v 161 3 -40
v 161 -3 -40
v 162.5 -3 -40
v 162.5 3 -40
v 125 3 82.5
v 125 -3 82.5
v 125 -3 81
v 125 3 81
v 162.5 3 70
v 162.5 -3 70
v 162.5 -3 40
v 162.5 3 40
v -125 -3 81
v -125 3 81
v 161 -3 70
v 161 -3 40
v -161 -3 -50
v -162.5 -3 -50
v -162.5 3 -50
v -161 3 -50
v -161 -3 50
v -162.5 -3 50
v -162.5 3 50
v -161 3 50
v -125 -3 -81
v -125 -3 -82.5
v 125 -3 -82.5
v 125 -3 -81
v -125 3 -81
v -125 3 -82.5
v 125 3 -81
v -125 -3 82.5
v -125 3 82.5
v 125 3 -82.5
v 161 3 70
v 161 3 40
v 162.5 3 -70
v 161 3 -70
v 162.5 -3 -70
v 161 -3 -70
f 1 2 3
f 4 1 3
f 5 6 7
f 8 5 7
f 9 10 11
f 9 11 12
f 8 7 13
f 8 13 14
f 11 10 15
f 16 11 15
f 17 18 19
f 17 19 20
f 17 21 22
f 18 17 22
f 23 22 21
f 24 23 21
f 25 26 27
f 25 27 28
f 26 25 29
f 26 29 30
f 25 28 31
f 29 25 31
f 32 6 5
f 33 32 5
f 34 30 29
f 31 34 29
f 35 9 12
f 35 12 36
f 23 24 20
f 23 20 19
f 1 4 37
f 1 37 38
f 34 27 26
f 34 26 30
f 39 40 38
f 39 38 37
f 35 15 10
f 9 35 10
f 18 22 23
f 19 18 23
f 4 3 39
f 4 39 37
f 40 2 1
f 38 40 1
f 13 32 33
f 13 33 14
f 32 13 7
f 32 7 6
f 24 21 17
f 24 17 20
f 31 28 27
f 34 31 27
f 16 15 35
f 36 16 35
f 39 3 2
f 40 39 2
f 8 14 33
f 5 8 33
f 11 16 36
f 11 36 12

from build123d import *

# Parameters (mm, degrees)
MEMBER_20_X_20_1_DEPTH      = 324.25
MEMBER_20_X_20_1_DEPTH_BACK = 0.75
SKETCH1_W                   = 1.5
SKETCH1_H                   = 6
SKETCH1_ON_SEGMENT_2_W      = 1.5
SKETCH1_ON_SEGMENT_2_H      = 6
MEMBER_20_X_20_1_2_DEPTH    = 325
SKETCH1_ON_SEGMENT_3_W      = 1.5
SKETCH1_ON_SEGMENT_3_H      = 6
MEMBER_20_X_20_1_3_DEPTH    = 165.5
SKETCH1_ON_SEGMENT_4_W      = 1.5
SKETCH1_ON_SEGMENT_4_H      = 6
MEMBER_20_X_20_1_4_DEPTH    = 165.5
CUT_EXTRUDE_1_DEPTH         = 183.267660324
CUT_EXTRUDE_1_DEPTH_BACK    = 183.267660324
SKETCH_3_W                  = 40
SKETCH_3_H                  = 40
SKETCH_3_W_2                = 92.543604288
SKETCH_3_H_2                = 30.493794054
SKETCH_3_W_3                = 46.059335171
SKETCH_3_H_3                = 80


with BuildPart() as part:
    # Sketch1 → Member 20 X 20_1 (new, two sides: drawn at the far end of the back side and taken through both)
    with BuildSketch(Plane(origin=(161.75, 0, -81.75), x_dir=(0, 0, 1), z_dir=(-1, 0, 0)).offset(-MEMBER_20_X_20_1_DEPTH_BACK)):
        Rectangle(SKETCH1_W, SKETCH1_H)
    extrude(amount=MEMBER_20_X_20_1_DEPTH + MEMBER_20_X_20_1_DEPTH_BACK)


with BuildPart() as body_2:
    # Sketch1 on segment 2 (carried to segment 2) → Member 20 X 20_1 2 (new body)
    with BuildSketch(Plane(origin=(162.5, 0, 81.75), x_dir=(0, 0, 1), z_dir=(-1, 0, 0))):
        Rectangle(SKETCH1_ON_SEGMENT_2_W, SKETCH1_ON_SEGMENT_2_H)
    extrude(amount=MEMBER_20_X_20_1_2_DEPTH)


with BuildPart() as body_3:
    # Sketch1 on segment 3 (carried to segment 3) → Member 20 X 20_1 3 (new body)
    with BuildSketch(Plane(origin=(-161.75, 0, 82.75), x_dir=(-1, 0, 0), z_dir=(0, 0, -1))):
        Rectangle(SKETCH1_ON_SEGMENT_3_W, SKETCH1_ON_SEGMENT_3_H)
    extrude(amount=MEMBER_20_X_20_1_3_DEPTH)

    # Member 20 X 20_1 3 end butt 1
    split(bisect_by=Plane(origin=(-161.75, 0, 81), x_dir=(0, 1, 0), z_dir=(0, 0, -1)), keep=Keep.TOP)

    # Member 20 X 20_1 3 end butt 2
    split(bisect_by=Plane(origin=(-161.75, 0, -81), x_dir=(0, -1, 0), z_dir=(0, 0, 1)), keep=Keep.TOP)


with BuildPart() as body_4:
    # Sketch1 on segment 4 (carried to segment 4) → Member 20 X 20_1 4 (new body)
    with BuildSketch(Plane(origin=(161.75, 0, 82.75), x_dir=(-1, 0, 0), z_dir=(0, 0, -1))):
        Rectangle(SKETCH1_ON_SEGMENT_4_W, SKETCH1_ON_SEGMENT_4_H)
    extrude(amount=MEMBER_20_X_20_1_4_DEPTH)

    # Member 20 X 20_1 4 end butt 1
    split(bisect_by=Plane(origin=(161.75, 0, 81), x_dir=(0, 1, 0), z_dir=(0, 0, -1)), keep=Keep.TOP)

    # Member 20 X 20_1 4 end butt 2
    split(bisect_by=Plane(origin=(161.75, 0, -81), x_dir=(0, -1, 0), z_dir=(0, 0, 1)), keep=Keep.TOP)


with BuildPart() as cut_extrude_1_tool:
    # Эскиз3 → Вырез-Вытянуть1 (new, two sides: drawn at the far end of the back side and taken through both)
    with BuildSketch(Plane(origin=(0, 0, 0), x_dir=(1, 0, 0), z_dir=(0, 1, 0)).offset(-CUT_EXTRUDE_1_DEPTH_BACK)):
        with Locations((-145, 70)):
            Rectangle(SKETCH_3_W, SKETCH_3_H)
        with Locations((-145, -70)):
            Rectangle(SKETCH_3_W, SKETCH_3_H)
        with Locations((171.271802144, -85.246897027)):
            Rectangle(SKETCH_3_W_2, SKETCH_3_H_2)
        with Locations((150.205388499, 0)):
            Rectangle(SKETCH_3_W_3, SKETCH_3_H_3)
        with Locations((171.271802144, 85.246897027)):
            Rectangle(SKETCH_3_W_2, SKETCH_3_H_2)
    extrude(amount=CUT_EXTRUDE_1_DEPTH + CUT_EXTRUDE_1_DEPTH_BACK)


with BuildPart() as part_1:
    add(part.part)

    # Вырез-Вытянуть1: cut by cut_extrude_1_tool
    add(cut_extrude_1_tool.part, mode=Mode.SUBTRACT)


with BuildPart() as body_2_1:
    add(body_2.part)

    # Вырез-Вытянуть1: cut by cut_extrude_1_tool
    add(cut_extrude_1_tool.part, mode=Mode.SUBTRACT)


with BuildPart() as body_3_1:
    add(body_3.part)

    # Вырез-Вытянуть1: cut by cut_extrude_1_tool
    add(cut_extrude_1_tool.part, mode=Mode.SUBTRACT)


with BuildPart() as body_4_1:
    add(body_4.part)

    # Вырез-Вытянуть1: cut by cut_extrude_1_tool
    add(cut_extrude_1_tool.part, mode=Mode.SUBTRACT)


solid = Compound([part_1.part, body_2_1.part, body_3_1.part, body_4_1.part])
